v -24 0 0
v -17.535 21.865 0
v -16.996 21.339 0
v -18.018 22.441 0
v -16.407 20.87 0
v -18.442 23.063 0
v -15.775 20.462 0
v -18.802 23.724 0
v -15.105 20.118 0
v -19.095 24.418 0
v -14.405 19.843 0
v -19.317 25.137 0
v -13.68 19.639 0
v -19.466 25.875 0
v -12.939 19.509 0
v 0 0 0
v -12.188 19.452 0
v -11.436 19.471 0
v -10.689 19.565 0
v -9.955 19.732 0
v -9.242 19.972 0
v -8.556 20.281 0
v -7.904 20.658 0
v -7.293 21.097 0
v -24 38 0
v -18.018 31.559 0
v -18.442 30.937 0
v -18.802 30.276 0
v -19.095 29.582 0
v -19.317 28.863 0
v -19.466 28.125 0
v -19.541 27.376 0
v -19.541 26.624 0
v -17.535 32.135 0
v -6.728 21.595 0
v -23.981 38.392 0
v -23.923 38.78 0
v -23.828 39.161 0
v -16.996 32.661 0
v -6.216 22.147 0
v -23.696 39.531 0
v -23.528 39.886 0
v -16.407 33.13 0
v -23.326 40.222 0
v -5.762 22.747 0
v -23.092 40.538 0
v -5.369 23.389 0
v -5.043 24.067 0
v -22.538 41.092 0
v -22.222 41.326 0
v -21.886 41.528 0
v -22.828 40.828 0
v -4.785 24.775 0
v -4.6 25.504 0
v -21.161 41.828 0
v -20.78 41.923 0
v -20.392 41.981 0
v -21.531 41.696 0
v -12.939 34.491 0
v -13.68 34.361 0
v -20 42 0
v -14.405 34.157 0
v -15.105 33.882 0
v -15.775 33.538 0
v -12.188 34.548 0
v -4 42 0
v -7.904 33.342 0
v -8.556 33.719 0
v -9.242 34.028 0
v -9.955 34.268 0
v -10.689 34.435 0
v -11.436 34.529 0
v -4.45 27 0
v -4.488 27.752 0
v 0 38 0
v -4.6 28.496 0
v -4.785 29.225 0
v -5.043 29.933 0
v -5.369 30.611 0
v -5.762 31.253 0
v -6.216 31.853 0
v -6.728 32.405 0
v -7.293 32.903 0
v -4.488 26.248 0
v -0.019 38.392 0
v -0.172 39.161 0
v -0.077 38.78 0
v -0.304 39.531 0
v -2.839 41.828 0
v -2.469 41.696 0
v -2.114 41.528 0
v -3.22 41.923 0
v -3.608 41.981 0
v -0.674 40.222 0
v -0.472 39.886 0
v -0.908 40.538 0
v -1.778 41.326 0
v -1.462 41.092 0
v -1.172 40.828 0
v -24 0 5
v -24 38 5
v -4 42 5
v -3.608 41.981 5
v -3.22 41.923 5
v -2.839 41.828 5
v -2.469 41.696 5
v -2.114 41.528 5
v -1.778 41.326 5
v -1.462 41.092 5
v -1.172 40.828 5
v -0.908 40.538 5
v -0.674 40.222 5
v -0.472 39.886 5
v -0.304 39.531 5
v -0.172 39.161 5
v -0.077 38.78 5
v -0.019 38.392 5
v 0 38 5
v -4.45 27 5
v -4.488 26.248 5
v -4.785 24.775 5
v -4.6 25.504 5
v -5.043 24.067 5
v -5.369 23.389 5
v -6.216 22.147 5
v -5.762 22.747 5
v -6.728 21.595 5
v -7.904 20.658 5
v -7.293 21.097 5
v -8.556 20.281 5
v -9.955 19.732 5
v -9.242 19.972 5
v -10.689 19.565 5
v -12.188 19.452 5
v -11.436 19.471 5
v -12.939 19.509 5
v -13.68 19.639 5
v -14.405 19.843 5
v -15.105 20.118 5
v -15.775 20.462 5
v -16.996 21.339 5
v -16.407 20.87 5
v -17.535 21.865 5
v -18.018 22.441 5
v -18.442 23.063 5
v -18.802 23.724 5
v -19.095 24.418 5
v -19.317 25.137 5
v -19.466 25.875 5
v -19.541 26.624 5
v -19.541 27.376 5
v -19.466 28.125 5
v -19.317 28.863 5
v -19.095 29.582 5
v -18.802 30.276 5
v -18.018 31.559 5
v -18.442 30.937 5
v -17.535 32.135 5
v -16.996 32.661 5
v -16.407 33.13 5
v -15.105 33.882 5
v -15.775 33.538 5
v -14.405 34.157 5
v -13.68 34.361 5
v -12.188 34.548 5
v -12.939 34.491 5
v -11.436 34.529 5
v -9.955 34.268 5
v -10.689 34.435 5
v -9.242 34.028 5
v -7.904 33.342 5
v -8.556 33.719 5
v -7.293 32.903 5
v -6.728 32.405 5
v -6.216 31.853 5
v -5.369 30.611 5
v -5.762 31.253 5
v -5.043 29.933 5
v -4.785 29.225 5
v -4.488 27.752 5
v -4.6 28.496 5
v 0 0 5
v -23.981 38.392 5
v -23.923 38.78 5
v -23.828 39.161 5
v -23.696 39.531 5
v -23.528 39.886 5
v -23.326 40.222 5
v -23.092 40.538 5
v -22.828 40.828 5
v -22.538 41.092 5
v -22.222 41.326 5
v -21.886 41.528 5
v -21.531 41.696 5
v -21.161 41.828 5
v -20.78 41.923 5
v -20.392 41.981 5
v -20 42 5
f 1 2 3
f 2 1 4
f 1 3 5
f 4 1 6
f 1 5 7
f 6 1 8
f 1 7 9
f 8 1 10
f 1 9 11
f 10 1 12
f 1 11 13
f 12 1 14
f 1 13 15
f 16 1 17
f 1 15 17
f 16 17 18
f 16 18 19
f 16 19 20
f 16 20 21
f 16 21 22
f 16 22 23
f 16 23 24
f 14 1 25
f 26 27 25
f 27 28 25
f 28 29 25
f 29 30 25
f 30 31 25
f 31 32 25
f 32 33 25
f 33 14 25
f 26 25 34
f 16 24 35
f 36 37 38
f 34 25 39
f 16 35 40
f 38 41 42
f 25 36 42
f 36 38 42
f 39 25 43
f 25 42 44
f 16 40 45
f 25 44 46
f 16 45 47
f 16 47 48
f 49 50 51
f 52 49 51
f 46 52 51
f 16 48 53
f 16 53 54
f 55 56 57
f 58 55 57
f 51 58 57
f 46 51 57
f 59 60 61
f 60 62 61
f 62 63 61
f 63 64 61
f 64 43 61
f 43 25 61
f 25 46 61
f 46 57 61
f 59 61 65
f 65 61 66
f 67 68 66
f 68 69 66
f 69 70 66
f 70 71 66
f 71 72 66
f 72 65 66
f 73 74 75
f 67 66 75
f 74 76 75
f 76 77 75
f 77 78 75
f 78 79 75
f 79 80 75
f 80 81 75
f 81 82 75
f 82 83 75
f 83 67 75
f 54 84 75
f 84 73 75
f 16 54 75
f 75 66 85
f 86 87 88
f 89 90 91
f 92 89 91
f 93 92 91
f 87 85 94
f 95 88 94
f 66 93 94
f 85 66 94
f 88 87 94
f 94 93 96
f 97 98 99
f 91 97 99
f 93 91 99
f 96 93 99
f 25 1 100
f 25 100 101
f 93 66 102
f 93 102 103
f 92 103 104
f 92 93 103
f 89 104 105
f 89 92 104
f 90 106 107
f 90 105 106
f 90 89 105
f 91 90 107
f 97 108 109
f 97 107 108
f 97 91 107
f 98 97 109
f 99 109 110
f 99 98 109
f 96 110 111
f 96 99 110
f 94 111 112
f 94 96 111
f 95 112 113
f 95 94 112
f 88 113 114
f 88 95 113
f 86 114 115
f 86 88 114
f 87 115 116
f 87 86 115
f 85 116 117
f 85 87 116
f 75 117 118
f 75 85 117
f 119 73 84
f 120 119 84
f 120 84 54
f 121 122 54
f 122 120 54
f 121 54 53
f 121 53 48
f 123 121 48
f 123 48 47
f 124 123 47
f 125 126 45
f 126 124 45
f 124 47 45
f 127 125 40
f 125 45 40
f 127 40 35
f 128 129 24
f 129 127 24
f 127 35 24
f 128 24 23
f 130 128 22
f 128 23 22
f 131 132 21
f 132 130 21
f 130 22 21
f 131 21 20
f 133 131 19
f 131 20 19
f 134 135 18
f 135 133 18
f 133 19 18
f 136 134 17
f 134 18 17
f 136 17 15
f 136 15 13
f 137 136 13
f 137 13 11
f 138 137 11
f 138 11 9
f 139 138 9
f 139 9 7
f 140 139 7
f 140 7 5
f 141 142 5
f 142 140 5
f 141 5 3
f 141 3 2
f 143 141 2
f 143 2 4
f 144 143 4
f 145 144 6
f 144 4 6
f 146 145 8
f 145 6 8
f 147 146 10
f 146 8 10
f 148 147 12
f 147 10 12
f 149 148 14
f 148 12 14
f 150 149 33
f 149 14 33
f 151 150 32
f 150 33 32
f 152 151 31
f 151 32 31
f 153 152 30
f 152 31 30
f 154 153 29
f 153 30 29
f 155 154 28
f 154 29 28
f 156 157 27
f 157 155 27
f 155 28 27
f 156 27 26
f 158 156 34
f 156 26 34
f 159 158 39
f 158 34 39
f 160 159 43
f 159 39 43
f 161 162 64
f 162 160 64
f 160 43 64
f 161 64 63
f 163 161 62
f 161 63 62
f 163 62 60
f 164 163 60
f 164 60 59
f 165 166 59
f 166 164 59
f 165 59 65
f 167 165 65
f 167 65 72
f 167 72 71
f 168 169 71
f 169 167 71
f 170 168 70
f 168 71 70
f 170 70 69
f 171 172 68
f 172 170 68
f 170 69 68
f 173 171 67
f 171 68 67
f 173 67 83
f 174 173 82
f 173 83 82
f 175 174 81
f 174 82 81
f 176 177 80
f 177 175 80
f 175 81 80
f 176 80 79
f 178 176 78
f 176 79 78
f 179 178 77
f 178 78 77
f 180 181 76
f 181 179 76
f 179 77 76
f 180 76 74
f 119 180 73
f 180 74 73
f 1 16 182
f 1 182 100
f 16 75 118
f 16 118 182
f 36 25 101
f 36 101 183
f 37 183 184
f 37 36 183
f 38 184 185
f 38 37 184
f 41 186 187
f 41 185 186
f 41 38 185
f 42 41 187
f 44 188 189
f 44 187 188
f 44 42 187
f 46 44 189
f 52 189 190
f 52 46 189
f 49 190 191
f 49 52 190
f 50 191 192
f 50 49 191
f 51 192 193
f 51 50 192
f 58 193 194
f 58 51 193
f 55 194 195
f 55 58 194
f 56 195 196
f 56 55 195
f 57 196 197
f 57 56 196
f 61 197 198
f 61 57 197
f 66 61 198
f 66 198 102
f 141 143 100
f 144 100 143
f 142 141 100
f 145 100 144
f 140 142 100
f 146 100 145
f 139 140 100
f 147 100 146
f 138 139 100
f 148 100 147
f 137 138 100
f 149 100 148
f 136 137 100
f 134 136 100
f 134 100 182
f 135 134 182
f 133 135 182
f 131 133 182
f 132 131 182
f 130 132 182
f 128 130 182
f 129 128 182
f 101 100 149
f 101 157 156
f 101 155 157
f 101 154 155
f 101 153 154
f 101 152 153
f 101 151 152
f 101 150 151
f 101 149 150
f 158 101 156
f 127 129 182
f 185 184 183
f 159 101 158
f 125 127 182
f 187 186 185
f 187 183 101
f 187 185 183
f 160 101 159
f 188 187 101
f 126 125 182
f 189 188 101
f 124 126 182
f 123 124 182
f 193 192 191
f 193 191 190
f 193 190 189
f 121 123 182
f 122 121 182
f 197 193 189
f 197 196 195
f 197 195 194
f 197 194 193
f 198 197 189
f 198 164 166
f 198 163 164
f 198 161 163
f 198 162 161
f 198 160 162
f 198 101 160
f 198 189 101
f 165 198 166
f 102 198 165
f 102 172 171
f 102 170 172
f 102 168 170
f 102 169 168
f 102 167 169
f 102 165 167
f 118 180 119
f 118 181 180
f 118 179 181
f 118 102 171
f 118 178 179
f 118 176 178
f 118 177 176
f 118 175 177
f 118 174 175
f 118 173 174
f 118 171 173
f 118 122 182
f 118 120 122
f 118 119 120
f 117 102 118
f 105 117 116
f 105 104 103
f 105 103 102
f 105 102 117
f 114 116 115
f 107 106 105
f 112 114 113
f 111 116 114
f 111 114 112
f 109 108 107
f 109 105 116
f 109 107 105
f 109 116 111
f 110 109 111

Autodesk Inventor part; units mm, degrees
ref_plane "YZ Plane" through (0, 0, 0) normal (1, 0, 0) x (0, 1, 0)
ref_plane "XZ Plane" through (0, 0, 0) normal (0, 1, 0) x (-1, 0, 0)
ref_plane "XY Plane" through (0, 0, 0) normal (0, 0, 1) x (1, 0, 0)
sketch "스케치1" plane through (0, 0, 0) normal (0, 0, 1) x (1, 0, 0)
  line L0 (0, 0) -> (-24, 0)
  line L1 (-24, 0) -> (-24, 38)
  line L2 (-20, 42) -> (-4, 42)
  line L3 (0, 38) -> (0, 0)
  arc A0 (0, 38) -> (-4, 42) centre (-4, 38) ccw
  arc A1 (-20, 42) -> (-24, 38) centre (-20, 38) ccw
  circle A2 centre (-12, 27) radius 7.55
  point P0 (-24, 42)
  point P1 (0, 42)
  dimension "d0" = 24
  dimension "d1" = 42
  dimension "d2" = 4
  dimension "d4" = 15.1
extrude "돌출1" add sketch "스케치1" along normal blind 5
properties part number "베어링받침대" material "알루미늄 6061"
